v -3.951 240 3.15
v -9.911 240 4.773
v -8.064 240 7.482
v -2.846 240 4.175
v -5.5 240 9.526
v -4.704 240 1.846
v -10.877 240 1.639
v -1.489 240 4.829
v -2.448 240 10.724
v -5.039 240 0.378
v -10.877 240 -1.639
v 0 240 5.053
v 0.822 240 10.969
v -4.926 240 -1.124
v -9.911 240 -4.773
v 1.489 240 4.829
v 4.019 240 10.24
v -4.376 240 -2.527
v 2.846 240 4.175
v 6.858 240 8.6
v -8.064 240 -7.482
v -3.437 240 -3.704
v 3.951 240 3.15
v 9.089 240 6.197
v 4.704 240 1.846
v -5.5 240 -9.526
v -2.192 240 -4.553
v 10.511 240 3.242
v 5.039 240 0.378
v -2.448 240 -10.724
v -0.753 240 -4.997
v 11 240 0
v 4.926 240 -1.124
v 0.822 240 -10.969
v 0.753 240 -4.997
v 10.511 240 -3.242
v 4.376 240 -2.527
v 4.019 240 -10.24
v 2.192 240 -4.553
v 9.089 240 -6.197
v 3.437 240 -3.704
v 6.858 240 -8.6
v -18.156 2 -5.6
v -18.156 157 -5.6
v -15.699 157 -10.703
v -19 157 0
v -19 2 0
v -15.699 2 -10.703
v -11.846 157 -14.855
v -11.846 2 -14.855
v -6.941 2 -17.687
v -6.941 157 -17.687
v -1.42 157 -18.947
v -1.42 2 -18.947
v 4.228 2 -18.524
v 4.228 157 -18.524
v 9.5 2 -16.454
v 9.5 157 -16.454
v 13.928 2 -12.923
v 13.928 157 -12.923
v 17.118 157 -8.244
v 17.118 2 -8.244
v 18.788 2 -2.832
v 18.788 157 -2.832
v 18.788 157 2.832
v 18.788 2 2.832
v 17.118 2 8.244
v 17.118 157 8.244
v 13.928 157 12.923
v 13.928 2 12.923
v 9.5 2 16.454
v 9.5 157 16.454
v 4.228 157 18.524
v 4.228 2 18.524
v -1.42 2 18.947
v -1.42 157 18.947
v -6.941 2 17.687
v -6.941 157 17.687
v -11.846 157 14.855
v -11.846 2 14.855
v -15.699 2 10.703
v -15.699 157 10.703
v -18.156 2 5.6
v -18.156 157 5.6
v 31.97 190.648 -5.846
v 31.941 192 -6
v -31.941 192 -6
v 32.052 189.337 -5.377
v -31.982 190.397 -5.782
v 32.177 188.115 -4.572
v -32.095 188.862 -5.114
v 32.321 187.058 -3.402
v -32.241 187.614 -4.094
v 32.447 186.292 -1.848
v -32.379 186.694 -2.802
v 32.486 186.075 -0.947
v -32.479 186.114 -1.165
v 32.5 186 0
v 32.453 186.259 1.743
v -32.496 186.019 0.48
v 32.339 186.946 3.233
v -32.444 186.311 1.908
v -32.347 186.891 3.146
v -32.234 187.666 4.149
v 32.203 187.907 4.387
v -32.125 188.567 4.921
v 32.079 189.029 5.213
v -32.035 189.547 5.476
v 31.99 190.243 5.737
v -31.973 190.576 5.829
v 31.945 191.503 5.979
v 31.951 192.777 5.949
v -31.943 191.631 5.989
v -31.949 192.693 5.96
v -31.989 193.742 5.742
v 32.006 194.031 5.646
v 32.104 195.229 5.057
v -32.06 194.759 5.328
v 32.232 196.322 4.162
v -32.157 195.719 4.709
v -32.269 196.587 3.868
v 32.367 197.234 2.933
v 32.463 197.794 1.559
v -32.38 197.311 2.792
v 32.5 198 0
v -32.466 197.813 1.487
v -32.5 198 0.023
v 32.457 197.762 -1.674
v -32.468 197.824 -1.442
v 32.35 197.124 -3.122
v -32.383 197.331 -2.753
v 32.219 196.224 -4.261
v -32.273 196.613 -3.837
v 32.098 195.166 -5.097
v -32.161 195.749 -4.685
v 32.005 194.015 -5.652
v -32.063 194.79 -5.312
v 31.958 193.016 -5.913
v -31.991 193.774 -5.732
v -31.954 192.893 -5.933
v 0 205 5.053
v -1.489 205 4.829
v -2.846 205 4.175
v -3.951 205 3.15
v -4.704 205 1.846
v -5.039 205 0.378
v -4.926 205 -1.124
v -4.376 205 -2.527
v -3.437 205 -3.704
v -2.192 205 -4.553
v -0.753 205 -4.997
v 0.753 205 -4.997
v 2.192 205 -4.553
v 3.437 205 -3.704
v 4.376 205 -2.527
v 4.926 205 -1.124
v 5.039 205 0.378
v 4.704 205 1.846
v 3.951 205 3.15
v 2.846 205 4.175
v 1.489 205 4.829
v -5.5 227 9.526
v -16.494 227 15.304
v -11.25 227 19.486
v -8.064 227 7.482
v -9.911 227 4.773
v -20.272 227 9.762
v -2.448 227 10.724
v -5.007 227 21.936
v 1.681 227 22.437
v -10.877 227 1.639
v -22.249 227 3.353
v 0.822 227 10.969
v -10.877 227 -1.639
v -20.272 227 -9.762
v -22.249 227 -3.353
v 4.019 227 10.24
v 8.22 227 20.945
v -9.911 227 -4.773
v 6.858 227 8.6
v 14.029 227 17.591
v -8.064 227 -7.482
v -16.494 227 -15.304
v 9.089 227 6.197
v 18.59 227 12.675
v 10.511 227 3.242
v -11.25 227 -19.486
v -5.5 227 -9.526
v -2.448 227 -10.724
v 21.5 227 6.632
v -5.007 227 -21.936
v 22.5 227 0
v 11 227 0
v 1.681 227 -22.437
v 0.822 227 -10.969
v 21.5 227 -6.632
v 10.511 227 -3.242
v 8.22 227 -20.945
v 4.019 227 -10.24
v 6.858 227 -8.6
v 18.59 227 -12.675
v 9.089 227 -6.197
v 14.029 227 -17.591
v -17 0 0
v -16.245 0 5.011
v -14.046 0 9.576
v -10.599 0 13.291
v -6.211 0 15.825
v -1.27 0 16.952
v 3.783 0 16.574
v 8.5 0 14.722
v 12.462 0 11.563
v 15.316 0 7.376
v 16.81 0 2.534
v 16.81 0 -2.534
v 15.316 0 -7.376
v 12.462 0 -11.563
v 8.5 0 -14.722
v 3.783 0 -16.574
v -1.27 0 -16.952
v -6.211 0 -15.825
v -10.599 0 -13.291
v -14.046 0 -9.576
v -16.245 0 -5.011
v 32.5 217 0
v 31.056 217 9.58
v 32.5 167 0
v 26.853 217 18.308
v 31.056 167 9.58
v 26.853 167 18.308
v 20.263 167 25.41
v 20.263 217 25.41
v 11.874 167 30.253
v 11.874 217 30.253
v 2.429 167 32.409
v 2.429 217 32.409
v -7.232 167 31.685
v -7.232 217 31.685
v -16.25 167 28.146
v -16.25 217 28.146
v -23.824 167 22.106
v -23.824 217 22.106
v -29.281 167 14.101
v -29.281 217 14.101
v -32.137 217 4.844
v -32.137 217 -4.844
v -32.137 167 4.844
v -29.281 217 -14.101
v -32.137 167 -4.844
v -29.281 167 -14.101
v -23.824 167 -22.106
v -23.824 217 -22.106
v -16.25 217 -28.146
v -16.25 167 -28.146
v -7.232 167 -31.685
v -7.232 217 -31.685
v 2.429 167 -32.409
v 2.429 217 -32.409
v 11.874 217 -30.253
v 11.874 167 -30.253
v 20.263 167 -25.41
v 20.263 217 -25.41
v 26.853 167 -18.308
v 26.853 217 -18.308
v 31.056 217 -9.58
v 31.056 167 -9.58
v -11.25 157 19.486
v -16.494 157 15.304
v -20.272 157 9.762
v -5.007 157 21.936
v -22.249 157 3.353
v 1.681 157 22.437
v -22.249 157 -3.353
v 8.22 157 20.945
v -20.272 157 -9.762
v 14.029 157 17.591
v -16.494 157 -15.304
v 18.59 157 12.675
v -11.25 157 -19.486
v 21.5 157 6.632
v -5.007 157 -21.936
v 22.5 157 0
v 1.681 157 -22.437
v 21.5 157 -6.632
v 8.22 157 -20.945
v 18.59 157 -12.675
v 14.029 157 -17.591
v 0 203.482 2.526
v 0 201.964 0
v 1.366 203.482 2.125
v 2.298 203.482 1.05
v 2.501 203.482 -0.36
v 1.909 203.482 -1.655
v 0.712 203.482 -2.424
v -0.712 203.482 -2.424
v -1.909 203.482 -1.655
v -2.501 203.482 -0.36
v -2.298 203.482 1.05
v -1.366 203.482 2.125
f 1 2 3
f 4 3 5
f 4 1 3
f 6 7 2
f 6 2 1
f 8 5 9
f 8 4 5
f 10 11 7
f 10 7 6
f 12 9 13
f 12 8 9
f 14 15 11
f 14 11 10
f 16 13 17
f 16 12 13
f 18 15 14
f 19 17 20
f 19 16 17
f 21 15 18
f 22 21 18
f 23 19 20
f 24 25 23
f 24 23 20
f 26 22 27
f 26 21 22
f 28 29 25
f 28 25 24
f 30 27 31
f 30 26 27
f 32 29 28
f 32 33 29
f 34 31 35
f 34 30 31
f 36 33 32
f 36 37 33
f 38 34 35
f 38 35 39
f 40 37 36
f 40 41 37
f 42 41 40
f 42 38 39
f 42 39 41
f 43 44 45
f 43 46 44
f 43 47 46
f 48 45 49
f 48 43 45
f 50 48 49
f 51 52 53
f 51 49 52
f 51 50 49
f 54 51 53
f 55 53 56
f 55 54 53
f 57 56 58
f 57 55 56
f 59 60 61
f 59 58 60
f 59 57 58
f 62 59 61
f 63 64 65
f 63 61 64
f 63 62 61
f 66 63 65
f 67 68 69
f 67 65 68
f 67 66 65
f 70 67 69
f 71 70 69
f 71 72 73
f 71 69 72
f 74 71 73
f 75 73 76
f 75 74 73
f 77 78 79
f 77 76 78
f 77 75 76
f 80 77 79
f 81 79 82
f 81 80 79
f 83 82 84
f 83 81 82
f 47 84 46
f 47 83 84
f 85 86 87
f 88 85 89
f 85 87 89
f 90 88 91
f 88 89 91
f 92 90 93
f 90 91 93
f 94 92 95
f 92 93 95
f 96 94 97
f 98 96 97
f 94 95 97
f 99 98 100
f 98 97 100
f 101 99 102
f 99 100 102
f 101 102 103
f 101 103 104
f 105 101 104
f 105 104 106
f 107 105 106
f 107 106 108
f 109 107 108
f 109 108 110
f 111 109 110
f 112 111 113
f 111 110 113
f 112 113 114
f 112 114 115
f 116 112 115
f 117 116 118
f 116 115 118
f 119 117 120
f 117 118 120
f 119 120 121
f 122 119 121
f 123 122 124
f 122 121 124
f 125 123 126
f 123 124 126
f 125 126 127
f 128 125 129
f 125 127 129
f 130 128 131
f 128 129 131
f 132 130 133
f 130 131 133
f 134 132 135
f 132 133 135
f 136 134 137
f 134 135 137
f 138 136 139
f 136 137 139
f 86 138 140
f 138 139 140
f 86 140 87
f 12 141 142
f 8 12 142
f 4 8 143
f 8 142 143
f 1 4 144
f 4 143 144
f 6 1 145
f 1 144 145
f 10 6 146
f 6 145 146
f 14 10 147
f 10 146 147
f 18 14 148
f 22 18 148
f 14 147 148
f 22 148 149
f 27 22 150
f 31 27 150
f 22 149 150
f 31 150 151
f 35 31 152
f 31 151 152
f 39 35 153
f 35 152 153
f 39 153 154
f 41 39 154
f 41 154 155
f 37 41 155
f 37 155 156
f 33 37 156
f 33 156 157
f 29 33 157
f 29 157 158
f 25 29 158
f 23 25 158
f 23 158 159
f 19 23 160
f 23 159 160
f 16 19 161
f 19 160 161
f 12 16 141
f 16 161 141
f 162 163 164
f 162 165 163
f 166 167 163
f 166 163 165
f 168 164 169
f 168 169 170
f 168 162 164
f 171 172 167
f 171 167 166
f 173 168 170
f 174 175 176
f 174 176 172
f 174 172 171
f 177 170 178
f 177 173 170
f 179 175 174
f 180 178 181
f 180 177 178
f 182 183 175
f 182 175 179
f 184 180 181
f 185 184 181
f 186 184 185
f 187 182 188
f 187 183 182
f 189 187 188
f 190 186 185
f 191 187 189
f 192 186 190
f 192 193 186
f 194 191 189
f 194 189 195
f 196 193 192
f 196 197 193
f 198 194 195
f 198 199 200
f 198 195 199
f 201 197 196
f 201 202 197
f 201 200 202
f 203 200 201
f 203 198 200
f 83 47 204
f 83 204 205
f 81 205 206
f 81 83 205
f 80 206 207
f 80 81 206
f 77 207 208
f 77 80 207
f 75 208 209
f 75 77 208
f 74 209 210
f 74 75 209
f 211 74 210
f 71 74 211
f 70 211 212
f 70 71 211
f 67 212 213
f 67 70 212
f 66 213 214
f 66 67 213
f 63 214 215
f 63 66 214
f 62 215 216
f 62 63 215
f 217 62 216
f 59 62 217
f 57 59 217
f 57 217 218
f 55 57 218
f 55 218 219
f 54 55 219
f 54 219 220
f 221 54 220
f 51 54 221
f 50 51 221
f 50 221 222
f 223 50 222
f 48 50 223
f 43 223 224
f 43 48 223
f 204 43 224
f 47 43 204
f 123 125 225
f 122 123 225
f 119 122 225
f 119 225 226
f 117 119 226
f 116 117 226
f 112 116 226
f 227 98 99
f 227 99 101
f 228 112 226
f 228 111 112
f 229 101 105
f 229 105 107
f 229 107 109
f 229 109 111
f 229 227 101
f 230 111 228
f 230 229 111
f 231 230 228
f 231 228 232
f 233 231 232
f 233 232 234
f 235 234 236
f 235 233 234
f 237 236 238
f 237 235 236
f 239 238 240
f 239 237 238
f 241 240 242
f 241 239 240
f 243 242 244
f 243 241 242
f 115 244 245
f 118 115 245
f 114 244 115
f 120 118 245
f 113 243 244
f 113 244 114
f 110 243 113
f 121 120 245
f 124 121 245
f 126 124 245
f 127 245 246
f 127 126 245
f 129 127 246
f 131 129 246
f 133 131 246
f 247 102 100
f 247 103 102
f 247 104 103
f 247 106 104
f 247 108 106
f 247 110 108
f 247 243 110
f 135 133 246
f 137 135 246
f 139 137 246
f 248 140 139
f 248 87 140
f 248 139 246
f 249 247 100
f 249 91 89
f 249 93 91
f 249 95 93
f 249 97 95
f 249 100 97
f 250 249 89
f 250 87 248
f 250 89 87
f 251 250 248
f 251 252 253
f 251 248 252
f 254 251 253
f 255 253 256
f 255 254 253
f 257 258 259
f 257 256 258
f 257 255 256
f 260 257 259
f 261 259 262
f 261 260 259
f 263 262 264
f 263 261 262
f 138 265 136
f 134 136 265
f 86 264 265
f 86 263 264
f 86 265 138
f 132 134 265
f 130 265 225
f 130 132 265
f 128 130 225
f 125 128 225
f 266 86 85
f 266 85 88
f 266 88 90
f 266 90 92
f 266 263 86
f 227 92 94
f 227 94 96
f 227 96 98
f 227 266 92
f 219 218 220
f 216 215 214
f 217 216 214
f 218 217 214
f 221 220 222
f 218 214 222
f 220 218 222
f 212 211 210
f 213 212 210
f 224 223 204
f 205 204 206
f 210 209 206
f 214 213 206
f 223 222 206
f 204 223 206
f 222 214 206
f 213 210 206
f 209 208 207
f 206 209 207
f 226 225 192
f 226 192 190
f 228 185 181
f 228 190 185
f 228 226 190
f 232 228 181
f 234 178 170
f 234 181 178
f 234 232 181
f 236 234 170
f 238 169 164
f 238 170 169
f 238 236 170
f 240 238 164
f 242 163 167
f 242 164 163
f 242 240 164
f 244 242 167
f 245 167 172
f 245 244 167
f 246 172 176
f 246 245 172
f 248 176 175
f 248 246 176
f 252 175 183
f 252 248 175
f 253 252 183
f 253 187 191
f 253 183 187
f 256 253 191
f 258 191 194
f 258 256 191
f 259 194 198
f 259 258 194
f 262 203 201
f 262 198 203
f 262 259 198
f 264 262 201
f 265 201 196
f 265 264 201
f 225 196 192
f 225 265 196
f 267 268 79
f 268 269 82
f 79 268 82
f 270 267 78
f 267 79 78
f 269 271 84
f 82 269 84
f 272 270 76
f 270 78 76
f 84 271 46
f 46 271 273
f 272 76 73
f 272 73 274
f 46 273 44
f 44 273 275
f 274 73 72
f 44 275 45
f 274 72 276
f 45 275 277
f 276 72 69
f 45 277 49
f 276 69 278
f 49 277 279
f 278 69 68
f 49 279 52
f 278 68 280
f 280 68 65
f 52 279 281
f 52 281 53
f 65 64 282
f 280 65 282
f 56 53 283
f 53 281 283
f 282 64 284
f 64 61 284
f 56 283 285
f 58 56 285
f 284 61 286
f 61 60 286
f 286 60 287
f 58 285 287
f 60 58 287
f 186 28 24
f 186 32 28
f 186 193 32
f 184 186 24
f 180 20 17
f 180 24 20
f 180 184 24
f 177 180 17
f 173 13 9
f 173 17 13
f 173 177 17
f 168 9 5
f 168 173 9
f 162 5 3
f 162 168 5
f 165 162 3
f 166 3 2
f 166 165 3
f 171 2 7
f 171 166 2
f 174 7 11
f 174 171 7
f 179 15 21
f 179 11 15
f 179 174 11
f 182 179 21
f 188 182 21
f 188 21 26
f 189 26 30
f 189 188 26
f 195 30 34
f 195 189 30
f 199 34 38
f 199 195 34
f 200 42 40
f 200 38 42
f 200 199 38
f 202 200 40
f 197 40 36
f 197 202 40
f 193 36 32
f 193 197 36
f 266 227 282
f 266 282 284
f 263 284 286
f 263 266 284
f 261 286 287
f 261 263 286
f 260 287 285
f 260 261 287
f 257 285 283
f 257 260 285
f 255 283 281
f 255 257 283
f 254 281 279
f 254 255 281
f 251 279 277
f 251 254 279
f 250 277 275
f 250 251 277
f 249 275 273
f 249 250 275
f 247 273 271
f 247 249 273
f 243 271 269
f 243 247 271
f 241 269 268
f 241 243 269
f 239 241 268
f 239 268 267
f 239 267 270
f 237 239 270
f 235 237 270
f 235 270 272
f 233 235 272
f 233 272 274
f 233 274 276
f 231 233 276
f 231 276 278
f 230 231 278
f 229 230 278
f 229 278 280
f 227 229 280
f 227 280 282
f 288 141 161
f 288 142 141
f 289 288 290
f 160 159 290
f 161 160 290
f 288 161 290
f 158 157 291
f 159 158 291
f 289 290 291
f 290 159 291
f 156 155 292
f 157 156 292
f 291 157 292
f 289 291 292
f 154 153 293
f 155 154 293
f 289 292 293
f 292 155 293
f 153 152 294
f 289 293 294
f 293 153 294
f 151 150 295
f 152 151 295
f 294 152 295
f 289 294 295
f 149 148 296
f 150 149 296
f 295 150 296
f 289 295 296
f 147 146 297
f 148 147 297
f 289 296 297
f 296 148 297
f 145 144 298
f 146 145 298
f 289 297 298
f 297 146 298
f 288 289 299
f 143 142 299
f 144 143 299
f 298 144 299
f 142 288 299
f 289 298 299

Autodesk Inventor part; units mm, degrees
ref_plane "XZ Plane" through (0, 0, 0) normal (0, 1, 0) x (-1, 0, 0)
ref_plane "XY Plane" through (0, 0, 0) normal (0, 0, 1) x (1, 0, 0)
sketch "Sketch1" plane through (0, 0, 0) normal (0, 1, 0) x (-1, 0, 0)
  circle A0 centre (0, 0) radius 19
  dimension "d0" = 38
extrude "Extrusion1" add sketch "Sketch1" along normal blind 157
sketch "Sketch2" plane through (0, 157, 0) normal (0, 1, 0) x (1, 0, 0)
  circle A0 centre (0, 0) radius 32.5
  dimension "d3" = 65
extrude "Extrusion2" add sketch "Sketch2" along normal blind 70
sketch "Sketch3" plane through (0, 227, 0) normal (0, 1, 0) x (1, 0, 0)
  circle A0 centre (0, 0) radius 11
  dimension "d6" = 22
extrude "Extrusion3" add sketch "Sketch3" along normal blind 13
chamfer "Chamfer1" distance 10 angle 45 2 edges at (-32.5, 227, 0) (-32.5, 157, 0)
chamfer "Chamfer2" distance 2 angle 45 1 edges at (19, 0, 0)
thread "Thread1" size "M38x1.5" class "6g" standard "ISO Metric profile" length 155 offset 3
sketch "Sketch5" plane through (0, 240, 0) normal (0, 1, 0) x (1, 0, 0)
  point P0 (0, 0)
  point P1 (0, 0)
hole "Hole1" at (0, 240, 0) direction (0, -1, 0) diameter 10.106 depth 35 tip angle 118 thread size "M12x1.75" class "6H" standard "ISO Metric profile"
ref_plane "Work Plane1" through (32.5, 157, 0) normal (1, 0, 0) x (0, 1, 0)
sketch "Sketch8" plane through (32.5, 157, 0) normal (1, 0, 0) x (0, 1, 0)
  line L0 (60, -32.5) -> (60, 32.5) projected
  line L1 (10, -32.5) -> (60, -32.5) projected
  line L2 (10, 32.5) -> (10, -32.5) projected
  line L3 (10, 32.5) -> (60, 32.5) projected
  line L4 (60, 32.5) -> (10, -32.5) construction
  line L5 (60, -32.5) -> (10, 32.5) construction
  point P0 (-157, 0)
  point P1 (35, 0)
hole "Hole3" at (32.5, 192, 0) direction (-1, 0, 0) diameter 12 end through all
properties part number "screw.spindle" material "Steel, High Strength, Low Alloy"
